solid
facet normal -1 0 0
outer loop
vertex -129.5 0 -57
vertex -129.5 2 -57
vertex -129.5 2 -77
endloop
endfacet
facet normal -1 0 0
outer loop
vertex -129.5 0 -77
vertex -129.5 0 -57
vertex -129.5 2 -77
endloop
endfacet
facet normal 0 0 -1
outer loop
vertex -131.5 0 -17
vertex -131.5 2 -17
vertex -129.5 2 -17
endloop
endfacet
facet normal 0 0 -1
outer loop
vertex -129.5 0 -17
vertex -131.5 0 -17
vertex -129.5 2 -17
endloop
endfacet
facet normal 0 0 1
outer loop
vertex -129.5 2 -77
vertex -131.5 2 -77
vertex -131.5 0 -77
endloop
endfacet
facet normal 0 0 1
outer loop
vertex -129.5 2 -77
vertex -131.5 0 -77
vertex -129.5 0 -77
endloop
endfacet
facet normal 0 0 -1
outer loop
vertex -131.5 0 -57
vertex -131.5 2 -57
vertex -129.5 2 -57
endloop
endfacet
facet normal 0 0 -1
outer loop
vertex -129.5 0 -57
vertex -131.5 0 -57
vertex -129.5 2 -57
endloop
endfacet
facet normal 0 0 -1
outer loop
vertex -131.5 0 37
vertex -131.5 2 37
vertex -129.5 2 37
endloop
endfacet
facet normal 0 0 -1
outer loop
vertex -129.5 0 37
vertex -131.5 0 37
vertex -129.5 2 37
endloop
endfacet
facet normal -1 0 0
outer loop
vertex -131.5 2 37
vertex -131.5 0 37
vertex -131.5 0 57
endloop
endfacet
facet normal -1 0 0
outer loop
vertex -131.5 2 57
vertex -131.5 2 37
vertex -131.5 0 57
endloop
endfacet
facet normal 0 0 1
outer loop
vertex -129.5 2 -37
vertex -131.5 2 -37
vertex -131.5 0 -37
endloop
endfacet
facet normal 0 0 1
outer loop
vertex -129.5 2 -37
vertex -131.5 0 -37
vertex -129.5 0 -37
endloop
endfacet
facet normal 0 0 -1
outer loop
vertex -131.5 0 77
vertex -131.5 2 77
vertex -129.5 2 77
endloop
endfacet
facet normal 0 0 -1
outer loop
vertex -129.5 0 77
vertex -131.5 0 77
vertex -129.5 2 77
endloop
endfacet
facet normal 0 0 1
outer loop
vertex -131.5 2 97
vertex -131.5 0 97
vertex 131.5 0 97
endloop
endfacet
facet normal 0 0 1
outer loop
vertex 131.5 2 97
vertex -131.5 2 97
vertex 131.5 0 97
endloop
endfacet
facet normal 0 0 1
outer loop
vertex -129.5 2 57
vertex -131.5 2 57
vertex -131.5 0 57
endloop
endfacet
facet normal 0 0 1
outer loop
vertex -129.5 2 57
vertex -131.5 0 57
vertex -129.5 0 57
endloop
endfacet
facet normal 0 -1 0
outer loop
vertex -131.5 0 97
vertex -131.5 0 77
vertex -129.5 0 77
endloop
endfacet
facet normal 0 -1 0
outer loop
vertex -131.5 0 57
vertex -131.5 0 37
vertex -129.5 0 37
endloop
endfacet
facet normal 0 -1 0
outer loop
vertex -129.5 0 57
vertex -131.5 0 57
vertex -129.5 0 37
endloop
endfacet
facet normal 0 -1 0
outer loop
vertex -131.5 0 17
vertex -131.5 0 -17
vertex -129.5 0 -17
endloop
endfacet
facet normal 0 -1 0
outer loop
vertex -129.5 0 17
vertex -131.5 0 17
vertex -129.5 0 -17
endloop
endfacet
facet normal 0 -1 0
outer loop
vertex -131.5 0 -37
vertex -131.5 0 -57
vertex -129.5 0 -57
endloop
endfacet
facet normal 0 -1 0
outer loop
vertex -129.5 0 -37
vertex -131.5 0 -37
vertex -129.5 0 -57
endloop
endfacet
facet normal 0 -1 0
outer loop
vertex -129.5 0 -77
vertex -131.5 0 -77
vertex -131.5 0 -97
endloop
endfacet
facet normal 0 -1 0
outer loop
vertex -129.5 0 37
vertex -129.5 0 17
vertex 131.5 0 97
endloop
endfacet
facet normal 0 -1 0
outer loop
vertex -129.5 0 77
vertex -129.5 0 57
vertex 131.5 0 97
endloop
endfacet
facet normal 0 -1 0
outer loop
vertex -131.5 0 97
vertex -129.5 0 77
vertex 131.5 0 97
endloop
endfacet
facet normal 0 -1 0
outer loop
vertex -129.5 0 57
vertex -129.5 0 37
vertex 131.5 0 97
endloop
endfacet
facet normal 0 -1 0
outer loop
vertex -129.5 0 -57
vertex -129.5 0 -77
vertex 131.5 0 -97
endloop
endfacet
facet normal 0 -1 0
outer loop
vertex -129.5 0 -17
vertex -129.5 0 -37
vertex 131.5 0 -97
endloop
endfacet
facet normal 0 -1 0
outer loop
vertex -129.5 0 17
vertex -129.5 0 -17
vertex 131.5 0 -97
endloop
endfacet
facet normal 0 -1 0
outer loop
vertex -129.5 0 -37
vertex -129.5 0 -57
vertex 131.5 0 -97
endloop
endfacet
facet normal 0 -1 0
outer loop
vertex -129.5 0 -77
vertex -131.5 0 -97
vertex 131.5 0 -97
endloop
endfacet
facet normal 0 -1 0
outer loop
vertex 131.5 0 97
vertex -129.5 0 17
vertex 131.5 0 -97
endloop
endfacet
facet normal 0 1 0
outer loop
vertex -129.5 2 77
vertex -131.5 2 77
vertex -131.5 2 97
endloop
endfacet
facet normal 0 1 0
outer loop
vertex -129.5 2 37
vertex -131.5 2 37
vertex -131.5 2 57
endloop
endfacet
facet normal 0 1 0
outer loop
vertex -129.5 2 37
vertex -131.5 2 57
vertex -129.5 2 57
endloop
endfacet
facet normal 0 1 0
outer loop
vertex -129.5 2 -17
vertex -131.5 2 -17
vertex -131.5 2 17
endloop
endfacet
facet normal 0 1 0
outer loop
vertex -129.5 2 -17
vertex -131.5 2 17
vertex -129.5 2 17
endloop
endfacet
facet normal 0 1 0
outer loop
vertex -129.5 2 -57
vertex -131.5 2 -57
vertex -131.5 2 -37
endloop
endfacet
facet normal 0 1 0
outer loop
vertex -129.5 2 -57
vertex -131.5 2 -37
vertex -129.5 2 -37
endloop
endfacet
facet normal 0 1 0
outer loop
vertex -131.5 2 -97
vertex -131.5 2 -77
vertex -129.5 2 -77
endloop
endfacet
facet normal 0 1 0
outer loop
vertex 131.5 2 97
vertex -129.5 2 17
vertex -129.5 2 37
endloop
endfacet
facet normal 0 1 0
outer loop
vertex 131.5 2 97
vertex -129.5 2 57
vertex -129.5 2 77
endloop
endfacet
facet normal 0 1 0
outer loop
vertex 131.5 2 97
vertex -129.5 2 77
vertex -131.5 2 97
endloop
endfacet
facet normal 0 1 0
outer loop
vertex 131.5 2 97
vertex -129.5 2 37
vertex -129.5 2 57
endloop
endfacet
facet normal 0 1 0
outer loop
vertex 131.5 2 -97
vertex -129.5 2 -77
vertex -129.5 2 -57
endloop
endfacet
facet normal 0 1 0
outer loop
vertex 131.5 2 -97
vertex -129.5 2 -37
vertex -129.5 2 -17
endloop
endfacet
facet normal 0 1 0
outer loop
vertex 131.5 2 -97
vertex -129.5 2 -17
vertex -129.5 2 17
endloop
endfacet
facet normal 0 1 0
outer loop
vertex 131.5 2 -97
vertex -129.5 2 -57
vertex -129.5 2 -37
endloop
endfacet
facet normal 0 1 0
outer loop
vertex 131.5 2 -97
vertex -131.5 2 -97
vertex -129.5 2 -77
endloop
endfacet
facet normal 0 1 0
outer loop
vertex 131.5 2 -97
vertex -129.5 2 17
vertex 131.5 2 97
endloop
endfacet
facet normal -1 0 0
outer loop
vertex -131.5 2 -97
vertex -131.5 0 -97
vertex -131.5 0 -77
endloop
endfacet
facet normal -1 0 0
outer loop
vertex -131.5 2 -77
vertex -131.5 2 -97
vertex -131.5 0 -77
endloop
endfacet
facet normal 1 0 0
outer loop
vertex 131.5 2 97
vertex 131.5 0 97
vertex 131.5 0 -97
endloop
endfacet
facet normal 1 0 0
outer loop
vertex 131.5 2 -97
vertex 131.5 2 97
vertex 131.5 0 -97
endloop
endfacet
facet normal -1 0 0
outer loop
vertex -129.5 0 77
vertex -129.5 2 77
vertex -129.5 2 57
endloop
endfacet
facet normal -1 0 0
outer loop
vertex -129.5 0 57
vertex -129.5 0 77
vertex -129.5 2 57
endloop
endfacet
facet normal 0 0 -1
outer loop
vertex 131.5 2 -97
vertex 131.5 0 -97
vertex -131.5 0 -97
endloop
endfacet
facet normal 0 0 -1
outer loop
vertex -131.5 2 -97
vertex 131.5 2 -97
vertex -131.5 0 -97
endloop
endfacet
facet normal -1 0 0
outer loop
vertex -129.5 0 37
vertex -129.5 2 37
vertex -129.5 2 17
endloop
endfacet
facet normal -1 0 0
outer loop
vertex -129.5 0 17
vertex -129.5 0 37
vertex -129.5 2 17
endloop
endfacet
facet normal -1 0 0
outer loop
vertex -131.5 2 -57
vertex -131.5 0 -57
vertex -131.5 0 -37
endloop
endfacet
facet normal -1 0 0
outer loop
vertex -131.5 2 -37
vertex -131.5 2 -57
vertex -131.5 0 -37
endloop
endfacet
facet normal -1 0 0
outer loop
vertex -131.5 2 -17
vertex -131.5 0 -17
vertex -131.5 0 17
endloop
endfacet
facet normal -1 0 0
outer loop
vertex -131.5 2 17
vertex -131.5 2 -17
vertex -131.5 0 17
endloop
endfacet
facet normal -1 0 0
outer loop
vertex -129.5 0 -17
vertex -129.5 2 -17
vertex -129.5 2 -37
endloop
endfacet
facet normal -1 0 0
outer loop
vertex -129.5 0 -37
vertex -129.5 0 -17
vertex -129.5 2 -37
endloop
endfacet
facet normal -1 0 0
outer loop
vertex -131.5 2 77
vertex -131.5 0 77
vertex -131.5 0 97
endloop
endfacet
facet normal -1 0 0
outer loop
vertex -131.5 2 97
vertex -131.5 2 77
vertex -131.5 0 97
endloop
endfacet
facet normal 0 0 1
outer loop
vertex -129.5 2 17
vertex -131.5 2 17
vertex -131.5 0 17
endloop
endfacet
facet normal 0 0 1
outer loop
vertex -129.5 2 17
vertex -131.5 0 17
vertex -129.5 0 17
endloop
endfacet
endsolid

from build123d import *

# Parameters (mm, degrees)
BOSS_EXTRUDE1_DEPTH = 2
SKETCH4_W           = 2
SKETCH4_H           = 20
CUT_EXTRUDE2_DEPTH  = 10


with BuildPart() as part:
    # Sketch1 → Boss-Extrude1 (new body)
    with BuildSketch(Plane(origin=(0, 0, 0), x_dir=(1, 0, 0), z_dir=(0, 1, 0))):
        Polygon((131.5, -97), (131.5, -77), (131.5, -57), (131.5, -37), (131.5, -17), (131.5, 17), (131.5, 37), (131.5, 57), (131.5, 77), (131.5, 97), (113.5, 97), (103.5, 97), (83.5, 97), (73.5, 97), (53.5, 97), (-23.5, 97), (-43.5, 97), (-53.5, 97), (-73.5, 97), (-83.5, 97), (-103.5, 97), (-113.5, 97), (-131.5, 97), (-131.5, -97), (-113.5, -97), (-103.5, -97), (-83.5, -97), (-73.5, -97), (-53.5, -97), (-43.5, -97), (-23.5, -97), (53.5, -97), (73.5, -97), (83.5, -97), (103.5, -97), (113.5, -97), align=None)
    extrude(amount=BOSS_EXTRUDE1_DEPTH)

    # Sketch4 → Cut-Extrude2 (cut)
    with BuildSketch(Plane(origin=(0, 2, 0), x_dir=(1, 0, 0), z_dir=(0, 1, 0))):
        with Locations((-130.5, 67)):
            Rectangle(SKETCH4_W, SKETCH4_H)
        with Locations((-130.5, 27)):
            Rectangle(SKETCH4_W, SKETCH4_H)
        with Locations((-130.5, -27)):
            Rectangle(SKETCH4_W, SKETCH4_H)
        with Locations((-130.5, -67)):
            Rectangle(SKETCH4_W, SKETCH4_H)
    extrude(amount=-CUT_EXTRUDE2_DEPTH, mode=Mode.SUBTRACT)


solid = part.part
